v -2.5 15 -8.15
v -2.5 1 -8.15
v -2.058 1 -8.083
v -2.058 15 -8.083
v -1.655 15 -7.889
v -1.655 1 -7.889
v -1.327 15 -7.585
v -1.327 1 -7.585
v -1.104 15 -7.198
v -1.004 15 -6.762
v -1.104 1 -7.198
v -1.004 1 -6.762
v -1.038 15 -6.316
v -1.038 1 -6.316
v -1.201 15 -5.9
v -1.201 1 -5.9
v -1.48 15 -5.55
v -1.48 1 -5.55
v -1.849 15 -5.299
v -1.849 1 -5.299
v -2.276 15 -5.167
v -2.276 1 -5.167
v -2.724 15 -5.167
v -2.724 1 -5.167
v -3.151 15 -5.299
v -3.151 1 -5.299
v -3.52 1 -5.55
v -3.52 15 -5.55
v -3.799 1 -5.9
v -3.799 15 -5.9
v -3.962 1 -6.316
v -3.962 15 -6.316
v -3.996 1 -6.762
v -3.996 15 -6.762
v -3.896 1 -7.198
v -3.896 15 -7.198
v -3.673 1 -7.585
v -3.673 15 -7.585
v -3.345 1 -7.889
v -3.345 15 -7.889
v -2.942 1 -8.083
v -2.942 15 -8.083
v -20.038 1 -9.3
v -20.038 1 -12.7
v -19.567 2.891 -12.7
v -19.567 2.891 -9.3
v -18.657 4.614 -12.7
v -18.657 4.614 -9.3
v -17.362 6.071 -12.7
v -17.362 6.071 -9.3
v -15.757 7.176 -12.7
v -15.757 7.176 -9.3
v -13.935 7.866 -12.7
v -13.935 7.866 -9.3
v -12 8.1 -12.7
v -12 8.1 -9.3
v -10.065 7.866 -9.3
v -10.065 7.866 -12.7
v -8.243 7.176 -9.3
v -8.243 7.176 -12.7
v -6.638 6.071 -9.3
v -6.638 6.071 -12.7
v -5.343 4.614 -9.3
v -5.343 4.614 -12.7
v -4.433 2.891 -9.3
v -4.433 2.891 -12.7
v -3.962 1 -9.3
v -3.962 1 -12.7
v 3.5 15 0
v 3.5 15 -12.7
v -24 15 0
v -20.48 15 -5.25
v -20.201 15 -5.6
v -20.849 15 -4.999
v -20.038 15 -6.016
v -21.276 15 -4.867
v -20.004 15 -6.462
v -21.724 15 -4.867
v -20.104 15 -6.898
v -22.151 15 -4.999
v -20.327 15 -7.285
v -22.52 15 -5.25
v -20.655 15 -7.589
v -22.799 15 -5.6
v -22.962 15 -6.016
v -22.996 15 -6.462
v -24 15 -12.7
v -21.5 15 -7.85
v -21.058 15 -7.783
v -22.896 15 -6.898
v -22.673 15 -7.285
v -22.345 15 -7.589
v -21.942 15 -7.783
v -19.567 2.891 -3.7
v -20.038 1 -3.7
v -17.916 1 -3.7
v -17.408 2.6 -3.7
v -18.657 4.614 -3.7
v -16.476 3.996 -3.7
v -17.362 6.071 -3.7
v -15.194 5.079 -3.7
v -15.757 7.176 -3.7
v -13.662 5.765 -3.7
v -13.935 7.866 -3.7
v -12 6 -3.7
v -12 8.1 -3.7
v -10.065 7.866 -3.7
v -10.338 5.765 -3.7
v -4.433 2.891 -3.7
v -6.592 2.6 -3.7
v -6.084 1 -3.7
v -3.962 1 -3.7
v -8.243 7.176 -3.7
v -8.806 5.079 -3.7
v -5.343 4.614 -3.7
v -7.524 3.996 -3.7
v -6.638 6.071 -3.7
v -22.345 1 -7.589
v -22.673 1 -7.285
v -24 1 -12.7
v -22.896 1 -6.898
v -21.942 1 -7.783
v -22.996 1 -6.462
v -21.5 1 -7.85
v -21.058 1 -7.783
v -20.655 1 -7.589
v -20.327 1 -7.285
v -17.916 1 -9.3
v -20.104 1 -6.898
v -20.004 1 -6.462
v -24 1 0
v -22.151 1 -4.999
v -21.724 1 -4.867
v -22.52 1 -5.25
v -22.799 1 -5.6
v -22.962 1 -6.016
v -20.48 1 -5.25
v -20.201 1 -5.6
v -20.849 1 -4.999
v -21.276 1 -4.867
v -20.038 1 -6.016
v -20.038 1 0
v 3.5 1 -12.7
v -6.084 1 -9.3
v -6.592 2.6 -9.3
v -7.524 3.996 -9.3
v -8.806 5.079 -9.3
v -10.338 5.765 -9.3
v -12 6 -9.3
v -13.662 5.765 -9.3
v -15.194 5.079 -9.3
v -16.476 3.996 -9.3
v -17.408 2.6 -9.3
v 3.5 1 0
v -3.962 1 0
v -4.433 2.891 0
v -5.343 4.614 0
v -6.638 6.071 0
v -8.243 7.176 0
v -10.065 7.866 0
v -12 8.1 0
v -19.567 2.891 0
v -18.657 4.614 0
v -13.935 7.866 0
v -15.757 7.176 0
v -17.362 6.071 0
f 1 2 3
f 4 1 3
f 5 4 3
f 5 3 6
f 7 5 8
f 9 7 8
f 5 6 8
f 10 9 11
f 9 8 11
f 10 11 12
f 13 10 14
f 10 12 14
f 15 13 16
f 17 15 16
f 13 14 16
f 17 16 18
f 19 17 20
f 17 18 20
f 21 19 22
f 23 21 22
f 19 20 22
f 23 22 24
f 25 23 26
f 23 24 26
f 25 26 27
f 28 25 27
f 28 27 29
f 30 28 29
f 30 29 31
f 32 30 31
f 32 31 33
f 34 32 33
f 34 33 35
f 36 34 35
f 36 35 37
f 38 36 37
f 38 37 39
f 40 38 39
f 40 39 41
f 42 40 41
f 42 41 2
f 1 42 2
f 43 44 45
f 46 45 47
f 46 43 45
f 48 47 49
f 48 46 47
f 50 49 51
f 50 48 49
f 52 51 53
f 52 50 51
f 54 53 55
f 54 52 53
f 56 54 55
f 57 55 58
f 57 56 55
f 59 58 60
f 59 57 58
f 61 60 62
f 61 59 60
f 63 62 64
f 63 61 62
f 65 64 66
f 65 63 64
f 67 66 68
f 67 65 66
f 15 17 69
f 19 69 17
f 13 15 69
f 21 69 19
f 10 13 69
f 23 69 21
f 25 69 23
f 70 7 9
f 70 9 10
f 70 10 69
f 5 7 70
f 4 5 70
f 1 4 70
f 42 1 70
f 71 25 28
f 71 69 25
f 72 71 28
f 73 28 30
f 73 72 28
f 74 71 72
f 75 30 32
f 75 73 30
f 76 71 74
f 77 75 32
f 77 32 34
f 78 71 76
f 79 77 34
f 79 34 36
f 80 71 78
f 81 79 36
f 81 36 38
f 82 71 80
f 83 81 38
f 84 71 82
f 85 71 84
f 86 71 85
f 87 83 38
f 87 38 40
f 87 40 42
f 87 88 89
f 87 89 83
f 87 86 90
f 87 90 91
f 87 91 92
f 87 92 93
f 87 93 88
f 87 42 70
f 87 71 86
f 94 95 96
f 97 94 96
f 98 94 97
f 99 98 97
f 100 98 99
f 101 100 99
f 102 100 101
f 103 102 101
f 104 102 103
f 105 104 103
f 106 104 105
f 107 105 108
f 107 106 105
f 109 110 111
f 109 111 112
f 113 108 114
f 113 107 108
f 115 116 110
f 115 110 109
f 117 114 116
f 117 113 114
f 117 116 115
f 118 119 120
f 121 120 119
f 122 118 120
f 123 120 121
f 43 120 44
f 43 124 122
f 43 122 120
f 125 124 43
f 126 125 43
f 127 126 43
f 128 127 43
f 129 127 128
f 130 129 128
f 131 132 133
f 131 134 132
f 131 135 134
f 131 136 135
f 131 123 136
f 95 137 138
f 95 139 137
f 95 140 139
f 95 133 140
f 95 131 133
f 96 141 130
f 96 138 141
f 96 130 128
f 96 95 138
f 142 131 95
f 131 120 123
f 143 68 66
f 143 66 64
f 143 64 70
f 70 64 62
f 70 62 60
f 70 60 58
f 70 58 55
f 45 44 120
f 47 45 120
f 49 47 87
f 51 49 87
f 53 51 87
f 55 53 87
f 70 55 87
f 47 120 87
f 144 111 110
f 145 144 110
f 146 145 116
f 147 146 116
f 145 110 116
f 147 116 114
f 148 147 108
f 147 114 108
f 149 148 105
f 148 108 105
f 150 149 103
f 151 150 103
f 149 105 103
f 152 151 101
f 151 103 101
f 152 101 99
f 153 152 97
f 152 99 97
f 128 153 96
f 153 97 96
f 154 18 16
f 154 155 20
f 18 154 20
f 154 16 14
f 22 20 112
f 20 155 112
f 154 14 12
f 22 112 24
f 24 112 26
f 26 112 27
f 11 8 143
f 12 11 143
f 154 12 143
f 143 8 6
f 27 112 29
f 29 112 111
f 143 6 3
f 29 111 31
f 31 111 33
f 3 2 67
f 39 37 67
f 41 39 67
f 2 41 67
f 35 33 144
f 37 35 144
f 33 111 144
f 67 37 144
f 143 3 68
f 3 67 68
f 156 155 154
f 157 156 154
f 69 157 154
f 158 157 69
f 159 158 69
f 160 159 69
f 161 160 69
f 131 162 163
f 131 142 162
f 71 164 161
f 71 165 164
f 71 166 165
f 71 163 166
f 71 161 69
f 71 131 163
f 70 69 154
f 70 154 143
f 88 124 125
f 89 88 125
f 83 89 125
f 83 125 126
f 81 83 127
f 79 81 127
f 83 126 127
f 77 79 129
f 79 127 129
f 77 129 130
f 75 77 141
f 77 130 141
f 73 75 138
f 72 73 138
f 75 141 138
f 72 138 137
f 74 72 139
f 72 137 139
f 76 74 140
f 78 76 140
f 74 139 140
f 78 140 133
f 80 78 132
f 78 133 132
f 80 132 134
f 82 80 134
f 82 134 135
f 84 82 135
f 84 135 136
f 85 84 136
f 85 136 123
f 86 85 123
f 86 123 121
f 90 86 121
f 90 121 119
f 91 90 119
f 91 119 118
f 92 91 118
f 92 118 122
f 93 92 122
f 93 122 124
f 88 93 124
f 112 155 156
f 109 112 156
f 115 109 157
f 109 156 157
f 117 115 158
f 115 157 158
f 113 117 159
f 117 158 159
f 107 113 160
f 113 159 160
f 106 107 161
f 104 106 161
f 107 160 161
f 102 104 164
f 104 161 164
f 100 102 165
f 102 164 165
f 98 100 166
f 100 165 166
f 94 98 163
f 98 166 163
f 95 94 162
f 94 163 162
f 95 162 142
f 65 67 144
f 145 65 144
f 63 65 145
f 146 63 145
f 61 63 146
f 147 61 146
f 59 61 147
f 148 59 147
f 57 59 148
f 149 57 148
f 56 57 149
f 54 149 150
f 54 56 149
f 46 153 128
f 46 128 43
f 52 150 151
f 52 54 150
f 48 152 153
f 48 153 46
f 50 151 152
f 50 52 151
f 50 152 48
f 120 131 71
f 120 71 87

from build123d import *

# Parameters (mm, degrees)
SKETCH1_W           = 24
SKETCH1_H           = 12.7
BOSS_EXTRUDE1_DEPTH = 15
SKETCH2_R           = 6
CUT_EXTRUDE1_DEPTH  = 15
SKETCH3_R           = 8.1
CUT_EXTRUDE2_DEPTH  = 3.7
CUT_EXTRUDE3_START  = -3.4
SKETCH5_R           = 8.1
CUT_EXTRUDE3_DEPTH  = 3.4
SKETCH6_W           = 24
SKETCH6_H           = 12.7
CUT_EXTRUDE4_DEPTH  = 1
SKETCH7_R           = 1.5
CUT_EXTRUDE5_DEPTH  = 22
SKETCH8_W           = 12.7
SKETCH8_H           = 14
BOSS_EXTRUDE2_DEPTH = 3.5


with BuildPart() as part:
    # Sketch1 → Boss-Extrude1 (new body)
    with BuildSketch(Plane(origin=(0, 0, 0), x_dir=(1, 0, 0), z_dir=(0, 1, 0))):
        with Locations((-12, 6.35)):
            Rectangle(SKETCH1_W, SKETCH1_H)
    extrude(amount=BOSS_EXTRUDE1_DEPTH)

    # Sketch2 → Cut-Extrude1 (cut)
    with BuildSketch(Plane.XY):
        with Locations((-12, 0)):
            Circle(SKETCH2_R)
    extrude(amount=-CUT_EXTRUDE1_DEPTH, mode=Mode.SUBTRACT)

    # Sketch3 → Cut-Extrude2 (cut)
    with BuildSketch(Plane.XY):
        with Locations((-12, 0)):
            Circle(SKETCH3_R)
    extrude(amount=-CUT_EXTRUDE2_DEPTH, mode=Mode.SUBTRACT)

    # Sketch5 → Cut-Extrude3 (cut)
    with BuildSketch(Plane(origin=(0, 0, -12.7), x_dir=(-1, 0, 0), z_dir=(0, 0, -1)).offset(CUT_EXTRUDE3_START)):
        with Locations((12, 0)):
            Circle(SKETCH5_R)
    extrude(amount=CUT_EXTRUDE3_DEPTH, mode=Mode.SUBTRACT)

    # Sketch6 → Cut-Extrude4 (cut)
    with BuildSketch(Plane.XZ):
        with Locations((-12, -6.35)):
            Rectangle(SKETCH6_W, SKETCH6_H)
    extrude(amount=-CUT_EXTRUDE4_DEPTH, mode=Mode.SUBTRACT)

    # Sketch7 → Cut-Extrude5 (cut)
    with BuildSketch(Plane.XZ.offset(-1)):
        with Locations(Location((-21.5, -6.35, 0), (0, 0, 270))):
            Circle(SKETCH7_R)
        with Locations(Location((-2.5, -6.65, 0), (0, 0, 270))):
            Circle(SKETCH7_R)
    extrude(amount=-CUT_EXTRUDE5_DEPTH, mode=Mode.SUBTRACT)

    # Sketch8 → Boss-Extrude2 (add)
    with BuildSketch(Plane(origin=(0, 0, 0), x_dir=(0, 0, -1), z_dir=(1, 0, 0))):
        with Locations((6.35, 8)):
            Rectangle(SKETCH8_W, SKETCH8_H)
    extrude(amount=BOSS_EXTRUDE2_DEPTH)


solid = part.part
